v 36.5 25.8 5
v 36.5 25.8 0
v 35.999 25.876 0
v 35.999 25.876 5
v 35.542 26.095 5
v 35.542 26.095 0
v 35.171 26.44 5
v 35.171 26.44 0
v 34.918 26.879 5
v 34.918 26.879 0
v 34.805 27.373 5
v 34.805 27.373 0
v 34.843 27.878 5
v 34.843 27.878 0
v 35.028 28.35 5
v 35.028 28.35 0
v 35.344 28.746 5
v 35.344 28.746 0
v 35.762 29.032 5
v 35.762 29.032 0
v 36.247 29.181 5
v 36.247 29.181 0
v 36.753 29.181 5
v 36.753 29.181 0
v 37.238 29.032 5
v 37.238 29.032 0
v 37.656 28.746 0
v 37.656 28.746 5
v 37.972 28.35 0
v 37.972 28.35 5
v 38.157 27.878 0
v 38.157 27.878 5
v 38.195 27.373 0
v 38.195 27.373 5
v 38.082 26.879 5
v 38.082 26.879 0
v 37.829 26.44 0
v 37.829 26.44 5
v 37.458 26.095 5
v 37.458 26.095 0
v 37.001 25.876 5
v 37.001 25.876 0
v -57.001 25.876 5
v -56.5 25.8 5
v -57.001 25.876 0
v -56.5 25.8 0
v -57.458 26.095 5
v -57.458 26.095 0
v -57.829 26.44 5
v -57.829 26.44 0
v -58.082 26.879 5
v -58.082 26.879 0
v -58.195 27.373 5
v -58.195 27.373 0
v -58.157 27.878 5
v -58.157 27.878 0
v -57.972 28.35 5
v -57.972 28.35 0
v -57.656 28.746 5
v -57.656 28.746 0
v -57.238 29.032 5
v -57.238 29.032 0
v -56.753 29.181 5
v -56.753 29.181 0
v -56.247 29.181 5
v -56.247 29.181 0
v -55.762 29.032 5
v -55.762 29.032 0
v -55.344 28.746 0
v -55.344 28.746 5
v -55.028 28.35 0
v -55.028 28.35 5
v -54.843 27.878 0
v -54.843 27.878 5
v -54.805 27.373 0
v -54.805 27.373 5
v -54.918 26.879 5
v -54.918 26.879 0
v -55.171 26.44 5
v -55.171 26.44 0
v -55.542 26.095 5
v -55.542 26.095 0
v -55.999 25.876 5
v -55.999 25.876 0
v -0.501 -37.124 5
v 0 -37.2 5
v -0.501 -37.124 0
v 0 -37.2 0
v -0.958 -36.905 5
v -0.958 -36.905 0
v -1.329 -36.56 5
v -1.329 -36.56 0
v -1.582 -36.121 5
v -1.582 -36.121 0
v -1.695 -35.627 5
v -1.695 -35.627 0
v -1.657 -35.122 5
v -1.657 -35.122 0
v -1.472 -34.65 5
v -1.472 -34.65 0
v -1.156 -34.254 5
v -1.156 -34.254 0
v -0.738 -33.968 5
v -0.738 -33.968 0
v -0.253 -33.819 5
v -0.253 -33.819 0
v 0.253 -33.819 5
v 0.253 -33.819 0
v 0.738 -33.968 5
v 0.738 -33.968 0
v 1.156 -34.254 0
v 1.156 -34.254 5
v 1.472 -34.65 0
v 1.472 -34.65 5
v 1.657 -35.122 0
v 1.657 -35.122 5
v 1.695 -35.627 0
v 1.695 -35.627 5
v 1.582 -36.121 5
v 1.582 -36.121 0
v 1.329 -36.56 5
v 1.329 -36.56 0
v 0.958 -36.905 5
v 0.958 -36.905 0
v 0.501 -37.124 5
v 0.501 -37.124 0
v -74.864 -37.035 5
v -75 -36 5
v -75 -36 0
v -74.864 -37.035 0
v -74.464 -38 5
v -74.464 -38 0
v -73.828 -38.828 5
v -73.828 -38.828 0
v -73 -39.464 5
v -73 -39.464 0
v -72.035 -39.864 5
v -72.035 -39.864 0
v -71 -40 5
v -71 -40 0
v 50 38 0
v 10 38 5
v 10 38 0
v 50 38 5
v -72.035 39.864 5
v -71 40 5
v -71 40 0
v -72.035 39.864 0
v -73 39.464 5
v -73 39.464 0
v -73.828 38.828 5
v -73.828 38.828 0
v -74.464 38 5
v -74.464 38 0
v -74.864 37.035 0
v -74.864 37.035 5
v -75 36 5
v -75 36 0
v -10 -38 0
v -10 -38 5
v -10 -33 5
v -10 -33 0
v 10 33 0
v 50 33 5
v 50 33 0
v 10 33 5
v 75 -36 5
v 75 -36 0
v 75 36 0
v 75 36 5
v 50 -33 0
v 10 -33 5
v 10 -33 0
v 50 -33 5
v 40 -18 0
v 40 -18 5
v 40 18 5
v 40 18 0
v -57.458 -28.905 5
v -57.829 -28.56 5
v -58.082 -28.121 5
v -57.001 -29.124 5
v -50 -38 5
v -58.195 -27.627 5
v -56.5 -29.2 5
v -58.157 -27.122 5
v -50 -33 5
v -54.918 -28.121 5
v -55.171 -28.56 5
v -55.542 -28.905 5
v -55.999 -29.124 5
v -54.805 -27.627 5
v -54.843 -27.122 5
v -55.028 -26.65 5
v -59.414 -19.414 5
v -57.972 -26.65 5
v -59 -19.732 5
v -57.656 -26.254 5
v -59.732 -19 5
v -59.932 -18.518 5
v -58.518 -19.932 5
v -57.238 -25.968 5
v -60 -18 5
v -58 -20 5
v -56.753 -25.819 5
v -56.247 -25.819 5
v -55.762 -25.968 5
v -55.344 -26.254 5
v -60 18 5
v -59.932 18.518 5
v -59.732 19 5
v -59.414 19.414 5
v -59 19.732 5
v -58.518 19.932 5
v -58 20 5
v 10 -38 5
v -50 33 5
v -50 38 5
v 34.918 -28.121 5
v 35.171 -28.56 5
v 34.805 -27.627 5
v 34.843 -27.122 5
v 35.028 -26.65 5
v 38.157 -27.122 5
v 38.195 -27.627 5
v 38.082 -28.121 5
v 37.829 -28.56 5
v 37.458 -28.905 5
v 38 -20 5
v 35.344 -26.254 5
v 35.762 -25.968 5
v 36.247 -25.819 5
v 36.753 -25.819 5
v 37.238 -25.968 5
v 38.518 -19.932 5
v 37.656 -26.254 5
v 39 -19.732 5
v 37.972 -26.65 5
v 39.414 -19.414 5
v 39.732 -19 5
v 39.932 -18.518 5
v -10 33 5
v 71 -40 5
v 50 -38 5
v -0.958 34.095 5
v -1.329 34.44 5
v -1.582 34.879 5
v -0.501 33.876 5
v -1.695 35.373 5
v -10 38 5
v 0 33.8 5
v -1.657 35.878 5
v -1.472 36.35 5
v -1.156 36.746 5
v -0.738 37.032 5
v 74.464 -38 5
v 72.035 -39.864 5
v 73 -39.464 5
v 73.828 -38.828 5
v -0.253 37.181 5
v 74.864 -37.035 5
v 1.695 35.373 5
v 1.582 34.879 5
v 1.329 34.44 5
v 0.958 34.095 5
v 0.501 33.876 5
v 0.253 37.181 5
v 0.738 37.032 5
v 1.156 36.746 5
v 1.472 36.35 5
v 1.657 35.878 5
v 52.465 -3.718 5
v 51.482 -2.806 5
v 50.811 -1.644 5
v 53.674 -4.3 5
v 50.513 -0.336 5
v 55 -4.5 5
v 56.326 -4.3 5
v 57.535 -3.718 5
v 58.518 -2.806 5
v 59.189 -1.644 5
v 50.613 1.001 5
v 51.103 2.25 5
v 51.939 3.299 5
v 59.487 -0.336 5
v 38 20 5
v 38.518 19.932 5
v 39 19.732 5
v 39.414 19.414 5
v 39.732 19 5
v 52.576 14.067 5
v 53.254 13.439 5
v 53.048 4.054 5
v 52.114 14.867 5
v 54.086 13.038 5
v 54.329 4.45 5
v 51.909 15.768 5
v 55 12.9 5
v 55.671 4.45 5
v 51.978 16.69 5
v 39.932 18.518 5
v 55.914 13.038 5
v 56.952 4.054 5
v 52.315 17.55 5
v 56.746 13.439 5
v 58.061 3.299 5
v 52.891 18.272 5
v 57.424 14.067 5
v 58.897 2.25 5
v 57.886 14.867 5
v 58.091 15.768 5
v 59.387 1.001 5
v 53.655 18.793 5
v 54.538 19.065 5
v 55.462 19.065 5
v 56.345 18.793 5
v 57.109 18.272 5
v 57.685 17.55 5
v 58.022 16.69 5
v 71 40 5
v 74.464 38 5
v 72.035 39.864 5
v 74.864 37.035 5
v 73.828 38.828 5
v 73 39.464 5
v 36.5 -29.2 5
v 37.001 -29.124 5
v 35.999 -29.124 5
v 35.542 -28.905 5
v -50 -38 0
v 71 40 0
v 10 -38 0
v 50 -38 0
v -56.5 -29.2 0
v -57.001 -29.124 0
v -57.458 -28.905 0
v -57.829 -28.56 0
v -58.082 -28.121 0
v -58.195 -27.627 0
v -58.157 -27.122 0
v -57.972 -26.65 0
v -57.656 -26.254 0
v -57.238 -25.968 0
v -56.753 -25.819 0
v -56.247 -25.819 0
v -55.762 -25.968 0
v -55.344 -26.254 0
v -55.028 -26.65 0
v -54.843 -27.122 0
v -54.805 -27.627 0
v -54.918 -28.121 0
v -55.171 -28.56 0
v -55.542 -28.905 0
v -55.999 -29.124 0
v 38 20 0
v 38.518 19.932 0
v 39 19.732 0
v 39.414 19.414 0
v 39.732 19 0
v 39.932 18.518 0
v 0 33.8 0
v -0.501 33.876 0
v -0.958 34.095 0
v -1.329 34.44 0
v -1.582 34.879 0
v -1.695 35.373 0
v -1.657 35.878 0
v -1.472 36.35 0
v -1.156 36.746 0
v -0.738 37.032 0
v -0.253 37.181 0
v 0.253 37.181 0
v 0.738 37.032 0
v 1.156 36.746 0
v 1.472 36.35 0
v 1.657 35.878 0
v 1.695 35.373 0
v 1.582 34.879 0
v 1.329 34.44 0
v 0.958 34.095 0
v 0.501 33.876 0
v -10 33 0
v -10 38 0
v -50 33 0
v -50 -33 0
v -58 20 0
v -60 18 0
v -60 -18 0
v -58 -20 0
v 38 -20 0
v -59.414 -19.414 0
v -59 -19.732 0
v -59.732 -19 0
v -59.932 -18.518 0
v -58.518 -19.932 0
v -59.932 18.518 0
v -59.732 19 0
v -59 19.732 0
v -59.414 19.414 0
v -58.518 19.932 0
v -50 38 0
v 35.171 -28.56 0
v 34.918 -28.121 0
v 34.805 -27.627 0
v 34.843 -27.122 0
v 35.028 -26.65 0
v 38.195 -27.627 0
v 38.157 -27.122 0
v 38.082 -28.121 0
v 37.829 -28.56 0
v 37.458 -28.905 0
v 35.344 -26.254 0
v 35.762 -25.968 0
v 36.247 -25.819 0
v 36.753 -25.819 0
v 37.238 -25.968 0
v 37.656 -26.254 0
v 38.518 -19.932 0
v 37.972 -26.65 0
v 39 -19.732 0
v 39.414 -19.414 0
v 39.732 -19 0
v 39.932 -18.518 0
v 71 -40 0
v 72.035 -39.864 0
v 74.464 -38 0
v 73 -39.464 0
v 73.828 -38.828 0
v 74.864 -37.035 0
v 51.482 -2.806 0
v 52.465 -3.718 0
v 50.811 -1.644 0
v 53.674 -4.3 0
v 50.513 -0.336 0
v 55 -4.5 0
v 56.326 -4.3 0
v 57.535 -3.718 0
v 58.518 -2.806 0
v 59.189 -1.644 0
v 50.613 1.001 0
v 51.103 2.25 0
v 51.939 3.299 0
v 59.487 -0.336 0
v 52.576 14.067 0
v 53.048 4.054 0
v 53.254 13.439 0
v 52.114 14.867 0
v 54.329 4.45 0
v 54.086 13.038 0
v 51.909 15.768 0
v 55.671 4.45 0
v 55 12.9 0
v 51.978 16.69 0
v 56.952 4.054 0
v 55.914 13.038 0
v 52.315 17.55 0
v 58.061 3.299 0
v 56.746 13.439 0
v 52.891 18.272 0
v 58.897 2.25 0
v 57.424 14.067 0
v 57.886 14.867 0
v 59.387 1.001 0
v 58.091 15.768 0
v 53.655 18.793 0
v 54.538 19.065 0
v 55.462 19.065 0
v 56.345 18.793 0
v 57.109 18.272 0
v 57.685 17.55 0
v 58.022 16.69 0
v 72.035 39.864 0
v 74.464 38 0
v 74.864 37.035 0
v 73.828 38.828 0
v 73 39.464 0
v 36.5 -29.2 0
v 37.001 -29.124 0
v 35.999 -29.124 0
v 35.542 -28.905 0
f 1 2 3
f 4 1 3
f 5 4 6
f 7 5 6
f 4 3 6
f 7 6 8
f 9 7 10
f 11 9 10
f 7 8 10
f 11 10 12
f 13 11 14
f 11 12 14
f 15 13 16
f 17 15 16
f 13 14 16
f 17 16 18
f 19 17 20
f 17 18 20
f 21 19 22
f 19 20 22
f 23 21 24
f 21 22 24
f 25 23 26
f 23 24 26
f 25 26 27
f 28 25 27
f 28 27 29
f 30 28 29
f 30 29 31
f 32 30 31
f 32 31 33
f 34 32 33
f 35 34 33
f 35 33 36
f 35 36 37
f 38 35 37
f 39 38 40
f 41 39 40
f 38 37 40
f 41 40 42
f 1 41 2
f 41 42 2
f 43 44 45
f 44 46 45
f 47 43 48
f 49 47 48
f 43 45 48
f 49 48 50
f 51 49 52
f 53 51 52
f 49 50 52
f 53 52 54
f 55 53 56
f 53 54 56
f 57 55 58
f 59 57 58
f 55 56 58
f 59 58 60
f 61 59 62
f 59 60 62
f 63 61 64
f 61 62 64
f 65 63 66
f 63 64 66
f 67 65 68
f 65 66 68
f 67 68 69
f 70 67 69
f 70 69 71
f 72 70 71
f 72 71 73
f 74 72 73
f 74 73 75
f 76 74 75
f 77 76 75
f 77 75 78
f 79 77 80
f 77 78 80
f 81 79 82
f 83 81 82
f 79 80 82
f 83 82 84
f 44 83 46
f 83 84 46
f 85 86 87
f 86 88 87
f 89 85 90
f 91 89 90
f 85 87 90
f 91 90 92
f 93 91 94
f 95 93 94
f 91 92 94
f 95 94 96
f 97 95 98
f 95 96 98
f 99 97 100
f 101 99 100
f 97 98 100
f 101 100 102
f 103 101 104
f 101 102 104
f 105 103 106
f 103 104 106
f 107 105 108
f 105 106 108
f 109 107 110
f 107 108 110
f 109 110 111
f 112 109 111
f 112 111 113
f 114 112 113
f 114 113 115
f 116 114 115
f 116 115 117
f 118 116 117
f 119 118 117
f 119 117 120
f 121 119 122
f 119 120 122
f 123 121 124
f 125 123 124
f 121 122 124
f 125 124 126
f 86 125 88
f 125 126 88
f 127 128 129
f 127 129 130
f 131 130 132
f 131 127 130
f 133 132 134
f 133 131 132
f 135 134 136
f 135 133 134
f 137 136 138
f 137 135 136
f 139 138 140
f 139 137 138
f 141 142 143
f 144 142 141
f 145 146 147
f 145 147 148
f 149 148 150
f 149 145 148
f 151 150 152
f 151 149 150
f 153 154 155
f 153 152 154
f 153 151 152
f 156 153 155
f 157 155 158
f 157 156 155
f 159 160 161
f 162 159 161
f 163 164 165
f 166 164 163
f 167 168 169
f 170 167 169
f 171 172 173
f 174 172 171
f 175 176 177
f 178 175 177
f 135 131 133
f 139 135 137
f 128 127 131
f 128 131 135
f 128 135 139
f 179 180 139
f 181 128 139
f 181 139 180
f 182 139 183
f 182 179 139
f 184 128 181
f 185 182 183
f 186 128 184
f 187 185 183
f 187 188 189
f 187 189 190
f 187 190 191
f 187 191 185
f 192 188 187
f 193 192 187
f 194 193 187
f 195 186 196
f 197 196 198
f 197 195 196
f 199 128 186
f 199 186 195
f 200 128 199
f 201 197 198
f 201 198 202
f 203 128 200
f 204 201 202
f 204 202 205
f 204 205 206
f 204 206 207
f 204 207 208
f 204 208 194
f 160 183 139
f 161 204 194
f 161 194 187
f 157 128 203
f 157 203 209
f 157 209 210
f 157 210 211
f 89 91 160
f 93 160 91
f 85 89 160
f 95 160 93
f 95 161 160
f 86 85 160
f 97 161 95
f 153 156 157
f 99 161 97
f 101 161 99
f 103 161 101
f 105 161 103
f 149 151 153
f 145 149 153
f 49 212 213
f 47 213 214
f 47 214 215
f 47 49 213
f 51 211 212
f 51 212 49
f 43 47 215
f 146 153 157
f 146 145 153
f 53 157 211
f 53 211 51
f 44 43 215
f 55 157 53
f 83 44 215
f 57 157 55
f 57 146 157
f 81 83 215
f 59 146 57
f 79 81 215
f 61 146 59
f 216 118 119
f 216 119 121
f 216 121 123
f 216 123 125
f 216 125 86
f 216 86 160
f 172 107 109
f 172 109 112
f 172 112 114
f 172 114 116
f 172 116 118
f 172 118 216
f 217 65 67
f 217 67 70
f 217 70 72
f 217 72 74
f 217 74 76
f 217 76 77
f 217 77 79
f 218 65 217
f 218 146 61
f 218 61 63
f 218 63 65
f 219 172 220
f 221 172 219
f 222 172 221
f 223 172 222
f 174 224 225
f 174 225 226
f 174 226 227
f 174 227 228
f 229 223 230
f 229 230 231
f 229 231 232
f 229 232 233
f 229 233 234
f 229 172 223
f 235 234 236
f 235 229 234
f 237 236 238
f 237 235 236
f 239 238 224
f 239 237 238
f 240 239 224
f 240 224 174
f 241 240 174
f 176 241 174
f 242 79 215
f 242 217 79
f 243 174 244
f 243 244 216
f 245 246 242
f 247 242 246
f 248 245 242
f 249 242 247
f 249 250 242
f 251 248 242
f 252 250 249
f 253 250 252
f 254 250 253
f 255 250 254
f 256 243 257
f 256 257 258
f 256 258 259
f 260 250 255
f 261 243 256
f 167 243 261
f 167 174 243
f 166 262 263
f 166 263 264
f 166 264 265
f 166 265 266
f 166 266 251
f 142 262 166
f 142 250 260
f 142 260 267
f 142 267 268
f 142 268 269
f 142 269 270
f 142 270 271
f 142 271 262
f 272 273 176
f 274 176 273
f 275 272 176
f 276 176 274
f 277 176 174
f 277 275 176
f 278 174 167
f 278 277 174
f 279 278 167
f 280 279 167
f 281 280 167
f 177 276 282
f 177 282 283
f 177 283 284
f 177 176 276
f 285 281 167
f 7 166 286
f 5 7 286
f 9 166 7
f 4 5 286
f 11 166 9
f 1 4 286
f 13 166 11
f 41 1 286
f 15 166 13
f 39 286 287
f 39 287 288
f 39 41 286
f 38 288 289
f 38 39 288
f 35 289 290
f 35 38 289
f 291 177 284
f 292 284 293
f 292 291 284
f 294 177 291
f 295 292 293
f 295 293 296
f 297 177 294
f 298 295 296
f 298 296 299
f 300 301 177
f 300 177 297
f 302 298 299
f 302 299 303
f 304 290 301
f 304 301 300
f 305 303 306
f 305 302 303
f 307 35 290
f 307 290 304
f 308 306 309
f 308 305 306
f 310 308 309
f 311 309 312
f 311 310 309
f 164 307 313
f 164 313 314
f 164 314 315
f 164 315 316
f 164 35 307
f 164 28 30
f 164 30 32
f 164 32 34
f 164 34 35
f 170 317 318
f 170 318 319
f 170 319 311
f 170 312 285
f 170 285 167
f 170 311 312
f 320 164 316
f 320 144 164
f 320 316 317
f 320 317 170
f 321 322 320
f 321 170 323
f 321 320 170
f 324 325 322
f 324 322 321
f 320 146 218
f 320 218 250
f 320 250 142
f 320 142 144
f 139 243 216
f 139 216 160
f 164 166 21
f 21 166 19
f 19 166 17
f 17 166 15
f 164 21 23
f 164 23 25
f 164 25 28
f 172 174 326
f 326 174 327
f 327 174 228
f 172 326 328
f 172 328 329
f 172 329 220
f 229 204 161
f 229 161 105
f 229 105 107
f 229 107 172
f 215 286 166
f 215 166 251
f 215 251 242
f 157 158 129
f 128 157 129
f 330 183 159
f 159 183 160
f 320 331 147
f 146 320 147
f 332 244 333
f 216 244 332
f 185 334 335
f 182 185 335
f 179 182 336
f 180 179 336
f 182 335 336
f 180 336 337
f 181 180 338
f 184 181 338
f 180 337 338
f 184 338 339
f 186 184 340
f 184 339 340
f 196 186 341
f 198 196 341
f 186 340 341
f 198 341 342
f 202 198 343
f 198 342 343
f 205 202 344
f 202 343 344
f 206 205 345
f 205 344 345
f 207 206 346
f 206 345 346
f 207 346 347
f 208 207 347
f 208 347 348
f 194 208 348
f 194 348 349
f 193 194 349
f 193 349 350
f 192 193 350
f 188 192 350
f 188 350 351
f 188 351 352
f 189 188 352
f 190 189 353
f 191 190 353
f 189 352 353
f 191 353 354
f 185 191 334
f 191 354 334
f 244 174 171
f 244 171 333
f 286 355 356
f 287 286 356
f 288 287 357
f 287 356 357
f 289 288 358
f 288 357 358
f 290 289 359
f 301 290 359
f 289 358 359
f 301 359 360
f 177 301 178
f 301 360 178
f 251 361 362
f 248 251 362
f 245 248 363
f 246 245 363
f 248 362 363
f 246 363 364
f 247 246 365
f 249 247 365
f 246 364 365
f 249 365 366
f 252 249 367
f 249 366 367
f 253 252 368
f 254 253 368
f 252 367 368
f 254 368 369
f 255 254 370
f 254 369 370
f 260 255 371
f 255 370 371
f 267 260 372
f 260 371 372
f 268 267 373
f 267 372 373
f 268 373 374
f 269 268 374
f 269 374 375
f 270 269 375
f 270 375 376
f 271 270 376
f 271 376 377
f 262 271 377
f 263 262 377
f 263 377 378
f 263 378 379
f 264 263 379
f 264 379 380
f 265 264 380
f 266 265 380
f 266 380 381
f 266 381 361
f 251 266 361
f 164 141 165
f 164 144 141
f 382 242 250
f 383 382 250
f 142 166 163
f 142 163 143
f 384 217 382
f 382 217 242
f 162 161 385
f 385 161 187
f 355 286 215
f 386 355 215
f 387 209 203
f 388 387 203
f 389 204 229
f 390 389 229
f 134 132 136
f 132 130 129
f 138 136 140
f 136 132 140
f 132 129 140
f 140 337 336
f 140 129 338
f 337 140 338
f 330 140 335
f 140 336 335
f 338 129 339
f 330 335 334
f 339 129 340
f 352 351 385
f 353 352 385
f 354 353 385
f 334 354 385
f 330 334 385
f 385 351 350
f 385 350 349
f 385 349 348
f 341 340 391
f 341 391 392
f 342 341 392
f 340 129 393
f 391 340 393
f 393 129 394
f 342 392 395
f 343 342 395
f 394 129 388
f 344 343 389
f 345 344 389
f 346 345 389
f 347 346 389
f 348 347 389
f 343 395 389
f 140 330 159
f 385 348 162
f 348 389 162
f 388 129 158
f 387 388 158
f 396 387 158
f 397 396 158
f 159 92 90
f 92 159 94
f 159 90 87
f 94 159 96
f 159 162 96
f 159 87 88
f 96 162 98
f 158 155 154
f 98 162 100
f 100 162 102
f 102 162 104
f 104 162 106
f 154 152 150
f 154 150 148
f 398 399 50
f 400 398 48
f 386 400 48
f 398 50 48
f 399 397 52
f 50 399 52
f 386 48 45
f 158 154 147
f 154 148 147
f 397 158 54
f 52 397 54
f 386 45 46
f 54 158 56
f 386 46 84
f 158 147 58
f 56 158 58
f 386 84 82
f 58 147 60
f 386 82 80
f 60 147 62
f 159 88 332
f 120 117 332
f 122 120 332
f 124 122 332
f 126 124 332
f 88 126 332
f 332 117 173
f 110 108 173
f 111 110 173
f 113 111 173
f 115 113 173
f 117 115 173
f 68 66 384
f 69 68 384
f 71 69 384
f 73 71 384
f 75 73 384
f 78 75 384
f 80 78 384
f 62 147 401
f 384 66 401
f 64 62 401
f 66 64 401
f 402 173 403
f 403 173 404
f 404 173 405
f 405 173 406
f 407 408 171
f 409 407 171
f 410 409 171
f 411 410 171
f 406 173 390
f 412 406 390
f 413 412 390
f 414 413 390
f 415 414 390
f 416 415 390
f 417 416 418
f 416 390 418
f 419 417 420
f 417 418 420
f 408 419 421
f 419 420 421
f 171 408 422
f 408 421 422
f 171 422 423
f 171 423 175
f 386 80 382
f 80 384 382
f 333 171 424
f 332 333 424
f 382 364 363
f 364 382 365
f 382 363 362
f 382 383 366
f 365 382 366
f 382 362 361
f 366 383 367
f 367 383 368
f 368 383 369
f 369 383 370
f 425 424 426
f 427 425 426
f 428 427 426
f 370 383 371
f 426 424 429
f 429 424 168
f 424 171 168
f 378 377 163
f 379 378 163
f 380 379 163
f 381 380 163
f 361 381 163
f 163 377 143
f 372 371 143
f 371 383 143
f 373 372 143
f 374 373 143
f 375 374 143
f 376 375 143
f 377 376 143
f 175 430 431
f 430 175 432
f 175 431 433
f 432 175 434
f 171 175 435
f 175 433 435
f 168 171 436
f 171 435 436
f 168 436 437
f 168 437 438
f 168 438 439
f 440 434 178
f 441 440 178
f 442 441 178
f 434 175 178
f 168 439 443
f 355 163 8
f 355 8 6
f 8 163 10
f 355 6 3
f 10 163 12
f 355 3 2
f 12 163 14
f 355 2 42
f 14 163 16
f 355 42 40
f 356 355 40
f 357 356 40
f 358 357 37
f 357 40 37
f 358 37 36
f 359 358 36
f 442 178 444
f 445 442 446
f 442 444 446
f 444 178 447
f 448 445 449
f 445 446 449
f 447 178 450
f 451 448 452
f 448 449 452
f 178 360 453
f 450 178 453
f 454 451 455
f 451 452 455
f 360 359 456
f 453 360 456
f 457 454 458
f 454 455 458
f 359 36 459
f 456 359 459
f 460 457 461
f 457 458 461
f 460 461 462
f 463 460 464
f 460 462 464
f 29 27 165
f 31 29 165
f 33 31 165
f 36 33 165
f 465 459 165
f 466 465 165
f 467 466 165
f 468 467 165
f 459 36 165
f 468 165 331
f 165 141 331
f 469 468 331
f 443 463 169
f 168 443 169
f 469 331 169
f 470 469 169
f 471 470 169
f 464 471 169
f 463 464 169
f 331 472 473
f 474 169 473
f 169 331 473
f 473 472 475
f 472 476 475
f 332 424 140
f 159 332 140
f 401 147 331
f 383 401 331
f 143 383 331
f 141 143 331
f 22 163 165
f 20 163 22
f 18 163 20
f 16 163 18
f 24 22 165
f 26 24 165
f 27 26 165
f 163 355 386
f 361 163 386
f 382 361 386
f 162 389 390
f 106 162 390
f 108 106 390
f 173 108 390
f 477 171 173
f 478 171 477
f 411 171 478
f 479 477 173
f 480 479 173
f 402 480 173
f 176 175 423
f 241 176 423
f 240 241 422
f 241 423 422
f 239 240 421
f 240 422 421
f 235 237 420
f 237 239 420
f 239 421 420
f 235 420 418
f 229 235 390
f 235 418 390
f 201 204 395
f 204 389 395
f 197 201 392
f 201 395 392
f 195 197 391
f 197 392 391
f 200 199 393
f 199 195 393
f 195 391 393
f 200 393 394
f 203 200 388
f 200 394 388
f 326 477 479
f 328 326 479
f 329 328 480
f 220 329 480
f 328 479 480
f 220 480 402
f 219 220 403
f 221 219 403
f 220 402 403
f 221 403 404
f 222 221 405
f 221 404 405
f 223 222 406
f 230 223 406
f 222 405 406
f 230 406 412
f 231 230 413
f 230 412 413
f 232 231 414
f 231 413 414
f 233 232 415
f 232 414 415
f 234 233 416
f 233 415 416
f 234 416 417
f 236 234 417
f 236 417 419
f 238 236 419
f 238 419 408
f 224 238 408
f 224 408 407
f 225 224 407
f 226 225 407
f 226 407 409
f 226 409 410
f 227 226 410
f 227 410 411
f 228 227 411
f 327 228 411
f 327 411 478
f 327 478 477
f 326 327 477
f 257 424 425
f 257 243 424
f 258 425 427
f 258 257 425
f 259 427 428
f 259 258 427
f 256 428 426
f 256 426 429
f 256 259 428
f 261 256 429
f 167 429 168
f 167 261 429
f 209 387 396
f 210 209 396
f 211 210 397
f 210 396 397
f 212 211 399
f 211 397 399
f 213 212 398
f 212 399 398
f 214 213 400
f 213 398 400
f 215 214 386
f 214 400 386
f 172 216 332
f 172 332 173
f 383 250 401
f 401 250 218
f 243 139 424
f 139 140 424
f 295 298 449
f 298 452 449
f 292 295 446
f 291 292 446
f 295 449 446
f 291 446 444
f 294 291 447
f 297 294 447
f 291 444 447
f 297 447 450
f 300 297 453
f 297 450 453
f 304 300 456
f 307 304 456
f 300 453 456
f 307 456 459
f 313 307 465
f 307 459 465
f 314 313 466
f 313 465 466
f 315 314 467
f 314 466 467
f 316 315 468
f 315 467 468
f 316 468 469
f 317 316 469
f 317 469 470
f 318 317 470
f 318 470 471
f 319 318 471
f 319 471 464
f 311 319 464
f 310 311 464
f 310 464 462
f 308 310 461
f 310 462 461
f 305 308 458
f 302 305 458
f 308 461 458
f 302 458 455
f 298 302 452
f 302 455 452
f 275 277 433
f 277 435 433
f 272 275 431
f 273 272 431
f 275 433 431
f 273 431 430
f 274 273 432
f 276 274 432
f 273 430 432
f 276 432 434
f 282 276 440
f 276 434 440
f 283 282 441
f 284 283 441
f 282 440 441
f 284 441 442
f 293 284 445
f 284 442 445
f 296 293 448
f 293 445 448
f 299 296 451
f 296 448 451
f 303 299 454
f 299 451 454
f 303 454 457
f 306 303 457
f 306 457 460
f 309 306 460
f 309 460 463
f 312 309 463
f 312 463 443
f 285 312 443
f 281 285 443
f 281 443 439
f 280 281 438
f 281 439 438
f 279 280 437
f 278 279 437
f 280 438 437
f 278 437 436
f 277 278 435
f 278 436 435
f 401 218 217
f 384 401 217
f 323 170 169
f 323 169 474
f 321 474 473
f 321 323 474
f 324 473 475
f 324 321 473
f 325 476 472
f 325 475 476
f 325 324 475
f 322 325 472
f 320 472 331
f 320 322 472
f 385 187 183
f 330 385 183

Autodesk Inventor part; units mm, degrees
ref_plane "YZ Plane" through (0, 0, 0) normal (1, 0, 0) x (0, 1, 0)
ref_plane "XZ Plane" through (0, 0, 0) normal (0, 1, 0) x (-1, 0, 0)
ref_plane "XY Plane" through (0, 0, 0) normal (0, 0, 1) x (1, 0, 0)
sketch "Sketch1" plane through (0, 0, 0) normal (0, 0, 1) x (1, 0, 0)
  line L0 (-75, -40) -> (75, -40)
  line L1 (75, -40) -> (75, 40)
  line L2 (75, 40) -> (-75, 40)
  line L3 (-75, 40) -> (-75, -40)
  line L4 (-75, -40) -> (75, 40) construction
  line L5 (75, -40) -> (-75, 40) construction
  point P0 (0, 0)
  dimension "d0" = 150
  dimension "d1" = 80
extrude "Extrusion1" add sketch "Sketch1" along normal blind 5
sketch "Sketch4" plane through (0, 0, 5) normal (0, 0, 1) x (1, 0, 0)
  line L0 (-60, -20) -> (40, -20)
  line L1 (40, -20) -> (40, 20)
  line L2 (40, 20) -> (-60, 20)
  line L3 (-60, 20) -> (-60, -20)
  line L4 (-60, -20) -> (40, 20) construction
  line L5 (40, -20) -> (-60, 20) construction
  point P0 (0, 0)
  point P1 (-10, 0)
  point P2 (-10, 0)
  dimension "d8" = 100
  dimension "d9" = 40
  dimension "d10" = 10
extrude "Extrusion3" cut sketch "Sketch4" against normal through all
sketch "Sketch5" plane through (0, 0, 5) normal (0, 0, 1) x (1, 0, 0)
  line L0 (40, 20) -> (40, -20) projected
  point P0 (0, 0)
  point P1 (55, 0)
  dimension "d13" = 15
hole "Hole1" at (55, 0, 5) direction (0, 0, -1) diameter 9 depth 8 tip angle 118 clearance for "Countersunk Flat Head Screw ISO 2009/7046" size "M8" standard "ISO"
sketch "Sketch6" plane through (0, 0, 5) normal (0, 0, 1) x (1, 0, 0)
  line L0 (-56.5, -27.5) -> (36.5, -27.5) construction
  line L1 (36.5, -27.5) -> (36.5, 27.5) construction
  line L2 (36.5, 27.5) -> (-56.5, 27.5) construction
  line L3 (-56.5, 27.5) -> (-56.5, -27.5) construction
  line L4 (-56.5, -27.5) -> (36.5, 27.5) construction
  line L5 (36.5, -27.5) -> (-56.5, 27.5) construction
  point P0 (0, 0)
  point P1 (-10, 0)
  point P2 (-10, 0)
  dimension "d21" = 93
  dimension "d22" = 55
  dimension "d23" = 10
hole "Hole2" at (-56.5, 27.5, 5) at (36.5, 27.5, 5) at (36.5, -27.5, 5) at (-56.5, -27.5, 5) direction (0, 0, -1) diameter 3.4 depth 8 tip angle 118 clearance for "Countersunk Flat Head Screw ISO 2009/7046" size "M3" standard "ISO"
fillet "Fillet1" radius 2 4 edges at (-60, 20, 2.5) (-60, -20, 2.5) (40, -20, 2.5) (40, 20, 2.5)
fillet "Fillet2" radius 4 4 edges at (75, 40, 2.5) (-75, 40, 2.5) (75, -40, 2.5) (-75, -40, 2.5)
sketch "Sketch7" plane through (0, 0, 5) normal (0, 0, 1) x (1, 0, 0)
  line L0 (-50, 33) -> (50, 33) construction
  line L1 (50, 33) -> (50, 38) construction
  line L2 (50, 38) -> (-50, 38) construction
  line L3 (-50, 38) -> (-50, 33) construction
  line L4 (50, -38) -> (-50, -38) construction
  line L5 (-50, -38) -> (-50, -33) construction
  line L6 (-50, -33) -> (50, -33) construction
  line L7 (50, -33) -> (50, -38) construction
  line L8 (71, 40) -> (-71, 40) projected
  line L9 (-71, -40) -> (71, -40) projected
  line L10 (-50, 33) -> (-10, 33)
  line L11 (-10, 33) -> (-10, 38)
  line L12 (-10, 38) -> (-50, 38)
  line L13 (-50, 38) -> (-50, 33)
  line L14 (50, 33) -> (10, 33)
  line L15 (10, 33) -> (10, 38)
  line L16 (10, 38) -> (50, 38)
  line L17 (50, 38) -> (50, 33)
  line L18 (50, -38) -> (10, -38)
  line L19 (10, -38) -> (10, -33)
  line L20 (10, -33) -> (50, -33)
  line L21 (50, -33) -> (50, -38)
  line L22 (-50, -38) -> (-10, -38)
  line L23 (-10, -38) -> (-10, -33)
  line L24 (-10, -33) -> (-50, -33)
  line L25 (-50, -33) -> (-50, -38)
  point P0 (0, 0)
  point P1 (0, 38)
  dimension "d33" = 5
  dimension "d34" = 5
  dimension "d35" = 100
  dimension "d36" = 2
  dimension "d37" = 2
  dimension "d38" = 20
  dimension "d39" = 20
  dimension "d40" = 10
  dimension "d41" = 10
extrude "Extrusion4" cut sketch "Sketch7" against normal blind 5
sketch "Sketch8" plane through (0, 0, 5) normal (0, 0, 1) x (1, 0, 0)
  line L0 (-50, -33) -> (-10, -33) projected
  line L1 (-10, 33) -> (-50, 33) projected
  point P0 (0, 0)
  point P1 (0, 35.5)
  point P2 (0, -35.5)
  dimension "d44" = 2.5
  dimension "d45" = 2.5
hole "Hole3" at (0, 35.5, 5) at (0, -35.5, 5) direction (0, 0, -1) diameter 3.4 depth 8 tip angle 118 clearance for "Countersunk Flat Head Screw ISO 2009/7046" size "M3" standard "ISO"
sketch "Sketch11" plane through (0, 0, 5) normal (0, 0, 1) x (1, 0, 0)
  circle A0 centre (55, 0) radius 4.5 projected
  point P0 (0, 0)
  point P1 (55, 16)
  dimension "d53" = 16
hole "Hole4" at (55, 16, 5) direction (0, 0, -1) diameter 6.2 depth 8 tip angle 118
equation "\"d40\" = 0.5 * d38"
equation "\"d41\" = 0.5 * d39"
properties part number "Interrupter_Top" material "Polycarbonate, Clear"
